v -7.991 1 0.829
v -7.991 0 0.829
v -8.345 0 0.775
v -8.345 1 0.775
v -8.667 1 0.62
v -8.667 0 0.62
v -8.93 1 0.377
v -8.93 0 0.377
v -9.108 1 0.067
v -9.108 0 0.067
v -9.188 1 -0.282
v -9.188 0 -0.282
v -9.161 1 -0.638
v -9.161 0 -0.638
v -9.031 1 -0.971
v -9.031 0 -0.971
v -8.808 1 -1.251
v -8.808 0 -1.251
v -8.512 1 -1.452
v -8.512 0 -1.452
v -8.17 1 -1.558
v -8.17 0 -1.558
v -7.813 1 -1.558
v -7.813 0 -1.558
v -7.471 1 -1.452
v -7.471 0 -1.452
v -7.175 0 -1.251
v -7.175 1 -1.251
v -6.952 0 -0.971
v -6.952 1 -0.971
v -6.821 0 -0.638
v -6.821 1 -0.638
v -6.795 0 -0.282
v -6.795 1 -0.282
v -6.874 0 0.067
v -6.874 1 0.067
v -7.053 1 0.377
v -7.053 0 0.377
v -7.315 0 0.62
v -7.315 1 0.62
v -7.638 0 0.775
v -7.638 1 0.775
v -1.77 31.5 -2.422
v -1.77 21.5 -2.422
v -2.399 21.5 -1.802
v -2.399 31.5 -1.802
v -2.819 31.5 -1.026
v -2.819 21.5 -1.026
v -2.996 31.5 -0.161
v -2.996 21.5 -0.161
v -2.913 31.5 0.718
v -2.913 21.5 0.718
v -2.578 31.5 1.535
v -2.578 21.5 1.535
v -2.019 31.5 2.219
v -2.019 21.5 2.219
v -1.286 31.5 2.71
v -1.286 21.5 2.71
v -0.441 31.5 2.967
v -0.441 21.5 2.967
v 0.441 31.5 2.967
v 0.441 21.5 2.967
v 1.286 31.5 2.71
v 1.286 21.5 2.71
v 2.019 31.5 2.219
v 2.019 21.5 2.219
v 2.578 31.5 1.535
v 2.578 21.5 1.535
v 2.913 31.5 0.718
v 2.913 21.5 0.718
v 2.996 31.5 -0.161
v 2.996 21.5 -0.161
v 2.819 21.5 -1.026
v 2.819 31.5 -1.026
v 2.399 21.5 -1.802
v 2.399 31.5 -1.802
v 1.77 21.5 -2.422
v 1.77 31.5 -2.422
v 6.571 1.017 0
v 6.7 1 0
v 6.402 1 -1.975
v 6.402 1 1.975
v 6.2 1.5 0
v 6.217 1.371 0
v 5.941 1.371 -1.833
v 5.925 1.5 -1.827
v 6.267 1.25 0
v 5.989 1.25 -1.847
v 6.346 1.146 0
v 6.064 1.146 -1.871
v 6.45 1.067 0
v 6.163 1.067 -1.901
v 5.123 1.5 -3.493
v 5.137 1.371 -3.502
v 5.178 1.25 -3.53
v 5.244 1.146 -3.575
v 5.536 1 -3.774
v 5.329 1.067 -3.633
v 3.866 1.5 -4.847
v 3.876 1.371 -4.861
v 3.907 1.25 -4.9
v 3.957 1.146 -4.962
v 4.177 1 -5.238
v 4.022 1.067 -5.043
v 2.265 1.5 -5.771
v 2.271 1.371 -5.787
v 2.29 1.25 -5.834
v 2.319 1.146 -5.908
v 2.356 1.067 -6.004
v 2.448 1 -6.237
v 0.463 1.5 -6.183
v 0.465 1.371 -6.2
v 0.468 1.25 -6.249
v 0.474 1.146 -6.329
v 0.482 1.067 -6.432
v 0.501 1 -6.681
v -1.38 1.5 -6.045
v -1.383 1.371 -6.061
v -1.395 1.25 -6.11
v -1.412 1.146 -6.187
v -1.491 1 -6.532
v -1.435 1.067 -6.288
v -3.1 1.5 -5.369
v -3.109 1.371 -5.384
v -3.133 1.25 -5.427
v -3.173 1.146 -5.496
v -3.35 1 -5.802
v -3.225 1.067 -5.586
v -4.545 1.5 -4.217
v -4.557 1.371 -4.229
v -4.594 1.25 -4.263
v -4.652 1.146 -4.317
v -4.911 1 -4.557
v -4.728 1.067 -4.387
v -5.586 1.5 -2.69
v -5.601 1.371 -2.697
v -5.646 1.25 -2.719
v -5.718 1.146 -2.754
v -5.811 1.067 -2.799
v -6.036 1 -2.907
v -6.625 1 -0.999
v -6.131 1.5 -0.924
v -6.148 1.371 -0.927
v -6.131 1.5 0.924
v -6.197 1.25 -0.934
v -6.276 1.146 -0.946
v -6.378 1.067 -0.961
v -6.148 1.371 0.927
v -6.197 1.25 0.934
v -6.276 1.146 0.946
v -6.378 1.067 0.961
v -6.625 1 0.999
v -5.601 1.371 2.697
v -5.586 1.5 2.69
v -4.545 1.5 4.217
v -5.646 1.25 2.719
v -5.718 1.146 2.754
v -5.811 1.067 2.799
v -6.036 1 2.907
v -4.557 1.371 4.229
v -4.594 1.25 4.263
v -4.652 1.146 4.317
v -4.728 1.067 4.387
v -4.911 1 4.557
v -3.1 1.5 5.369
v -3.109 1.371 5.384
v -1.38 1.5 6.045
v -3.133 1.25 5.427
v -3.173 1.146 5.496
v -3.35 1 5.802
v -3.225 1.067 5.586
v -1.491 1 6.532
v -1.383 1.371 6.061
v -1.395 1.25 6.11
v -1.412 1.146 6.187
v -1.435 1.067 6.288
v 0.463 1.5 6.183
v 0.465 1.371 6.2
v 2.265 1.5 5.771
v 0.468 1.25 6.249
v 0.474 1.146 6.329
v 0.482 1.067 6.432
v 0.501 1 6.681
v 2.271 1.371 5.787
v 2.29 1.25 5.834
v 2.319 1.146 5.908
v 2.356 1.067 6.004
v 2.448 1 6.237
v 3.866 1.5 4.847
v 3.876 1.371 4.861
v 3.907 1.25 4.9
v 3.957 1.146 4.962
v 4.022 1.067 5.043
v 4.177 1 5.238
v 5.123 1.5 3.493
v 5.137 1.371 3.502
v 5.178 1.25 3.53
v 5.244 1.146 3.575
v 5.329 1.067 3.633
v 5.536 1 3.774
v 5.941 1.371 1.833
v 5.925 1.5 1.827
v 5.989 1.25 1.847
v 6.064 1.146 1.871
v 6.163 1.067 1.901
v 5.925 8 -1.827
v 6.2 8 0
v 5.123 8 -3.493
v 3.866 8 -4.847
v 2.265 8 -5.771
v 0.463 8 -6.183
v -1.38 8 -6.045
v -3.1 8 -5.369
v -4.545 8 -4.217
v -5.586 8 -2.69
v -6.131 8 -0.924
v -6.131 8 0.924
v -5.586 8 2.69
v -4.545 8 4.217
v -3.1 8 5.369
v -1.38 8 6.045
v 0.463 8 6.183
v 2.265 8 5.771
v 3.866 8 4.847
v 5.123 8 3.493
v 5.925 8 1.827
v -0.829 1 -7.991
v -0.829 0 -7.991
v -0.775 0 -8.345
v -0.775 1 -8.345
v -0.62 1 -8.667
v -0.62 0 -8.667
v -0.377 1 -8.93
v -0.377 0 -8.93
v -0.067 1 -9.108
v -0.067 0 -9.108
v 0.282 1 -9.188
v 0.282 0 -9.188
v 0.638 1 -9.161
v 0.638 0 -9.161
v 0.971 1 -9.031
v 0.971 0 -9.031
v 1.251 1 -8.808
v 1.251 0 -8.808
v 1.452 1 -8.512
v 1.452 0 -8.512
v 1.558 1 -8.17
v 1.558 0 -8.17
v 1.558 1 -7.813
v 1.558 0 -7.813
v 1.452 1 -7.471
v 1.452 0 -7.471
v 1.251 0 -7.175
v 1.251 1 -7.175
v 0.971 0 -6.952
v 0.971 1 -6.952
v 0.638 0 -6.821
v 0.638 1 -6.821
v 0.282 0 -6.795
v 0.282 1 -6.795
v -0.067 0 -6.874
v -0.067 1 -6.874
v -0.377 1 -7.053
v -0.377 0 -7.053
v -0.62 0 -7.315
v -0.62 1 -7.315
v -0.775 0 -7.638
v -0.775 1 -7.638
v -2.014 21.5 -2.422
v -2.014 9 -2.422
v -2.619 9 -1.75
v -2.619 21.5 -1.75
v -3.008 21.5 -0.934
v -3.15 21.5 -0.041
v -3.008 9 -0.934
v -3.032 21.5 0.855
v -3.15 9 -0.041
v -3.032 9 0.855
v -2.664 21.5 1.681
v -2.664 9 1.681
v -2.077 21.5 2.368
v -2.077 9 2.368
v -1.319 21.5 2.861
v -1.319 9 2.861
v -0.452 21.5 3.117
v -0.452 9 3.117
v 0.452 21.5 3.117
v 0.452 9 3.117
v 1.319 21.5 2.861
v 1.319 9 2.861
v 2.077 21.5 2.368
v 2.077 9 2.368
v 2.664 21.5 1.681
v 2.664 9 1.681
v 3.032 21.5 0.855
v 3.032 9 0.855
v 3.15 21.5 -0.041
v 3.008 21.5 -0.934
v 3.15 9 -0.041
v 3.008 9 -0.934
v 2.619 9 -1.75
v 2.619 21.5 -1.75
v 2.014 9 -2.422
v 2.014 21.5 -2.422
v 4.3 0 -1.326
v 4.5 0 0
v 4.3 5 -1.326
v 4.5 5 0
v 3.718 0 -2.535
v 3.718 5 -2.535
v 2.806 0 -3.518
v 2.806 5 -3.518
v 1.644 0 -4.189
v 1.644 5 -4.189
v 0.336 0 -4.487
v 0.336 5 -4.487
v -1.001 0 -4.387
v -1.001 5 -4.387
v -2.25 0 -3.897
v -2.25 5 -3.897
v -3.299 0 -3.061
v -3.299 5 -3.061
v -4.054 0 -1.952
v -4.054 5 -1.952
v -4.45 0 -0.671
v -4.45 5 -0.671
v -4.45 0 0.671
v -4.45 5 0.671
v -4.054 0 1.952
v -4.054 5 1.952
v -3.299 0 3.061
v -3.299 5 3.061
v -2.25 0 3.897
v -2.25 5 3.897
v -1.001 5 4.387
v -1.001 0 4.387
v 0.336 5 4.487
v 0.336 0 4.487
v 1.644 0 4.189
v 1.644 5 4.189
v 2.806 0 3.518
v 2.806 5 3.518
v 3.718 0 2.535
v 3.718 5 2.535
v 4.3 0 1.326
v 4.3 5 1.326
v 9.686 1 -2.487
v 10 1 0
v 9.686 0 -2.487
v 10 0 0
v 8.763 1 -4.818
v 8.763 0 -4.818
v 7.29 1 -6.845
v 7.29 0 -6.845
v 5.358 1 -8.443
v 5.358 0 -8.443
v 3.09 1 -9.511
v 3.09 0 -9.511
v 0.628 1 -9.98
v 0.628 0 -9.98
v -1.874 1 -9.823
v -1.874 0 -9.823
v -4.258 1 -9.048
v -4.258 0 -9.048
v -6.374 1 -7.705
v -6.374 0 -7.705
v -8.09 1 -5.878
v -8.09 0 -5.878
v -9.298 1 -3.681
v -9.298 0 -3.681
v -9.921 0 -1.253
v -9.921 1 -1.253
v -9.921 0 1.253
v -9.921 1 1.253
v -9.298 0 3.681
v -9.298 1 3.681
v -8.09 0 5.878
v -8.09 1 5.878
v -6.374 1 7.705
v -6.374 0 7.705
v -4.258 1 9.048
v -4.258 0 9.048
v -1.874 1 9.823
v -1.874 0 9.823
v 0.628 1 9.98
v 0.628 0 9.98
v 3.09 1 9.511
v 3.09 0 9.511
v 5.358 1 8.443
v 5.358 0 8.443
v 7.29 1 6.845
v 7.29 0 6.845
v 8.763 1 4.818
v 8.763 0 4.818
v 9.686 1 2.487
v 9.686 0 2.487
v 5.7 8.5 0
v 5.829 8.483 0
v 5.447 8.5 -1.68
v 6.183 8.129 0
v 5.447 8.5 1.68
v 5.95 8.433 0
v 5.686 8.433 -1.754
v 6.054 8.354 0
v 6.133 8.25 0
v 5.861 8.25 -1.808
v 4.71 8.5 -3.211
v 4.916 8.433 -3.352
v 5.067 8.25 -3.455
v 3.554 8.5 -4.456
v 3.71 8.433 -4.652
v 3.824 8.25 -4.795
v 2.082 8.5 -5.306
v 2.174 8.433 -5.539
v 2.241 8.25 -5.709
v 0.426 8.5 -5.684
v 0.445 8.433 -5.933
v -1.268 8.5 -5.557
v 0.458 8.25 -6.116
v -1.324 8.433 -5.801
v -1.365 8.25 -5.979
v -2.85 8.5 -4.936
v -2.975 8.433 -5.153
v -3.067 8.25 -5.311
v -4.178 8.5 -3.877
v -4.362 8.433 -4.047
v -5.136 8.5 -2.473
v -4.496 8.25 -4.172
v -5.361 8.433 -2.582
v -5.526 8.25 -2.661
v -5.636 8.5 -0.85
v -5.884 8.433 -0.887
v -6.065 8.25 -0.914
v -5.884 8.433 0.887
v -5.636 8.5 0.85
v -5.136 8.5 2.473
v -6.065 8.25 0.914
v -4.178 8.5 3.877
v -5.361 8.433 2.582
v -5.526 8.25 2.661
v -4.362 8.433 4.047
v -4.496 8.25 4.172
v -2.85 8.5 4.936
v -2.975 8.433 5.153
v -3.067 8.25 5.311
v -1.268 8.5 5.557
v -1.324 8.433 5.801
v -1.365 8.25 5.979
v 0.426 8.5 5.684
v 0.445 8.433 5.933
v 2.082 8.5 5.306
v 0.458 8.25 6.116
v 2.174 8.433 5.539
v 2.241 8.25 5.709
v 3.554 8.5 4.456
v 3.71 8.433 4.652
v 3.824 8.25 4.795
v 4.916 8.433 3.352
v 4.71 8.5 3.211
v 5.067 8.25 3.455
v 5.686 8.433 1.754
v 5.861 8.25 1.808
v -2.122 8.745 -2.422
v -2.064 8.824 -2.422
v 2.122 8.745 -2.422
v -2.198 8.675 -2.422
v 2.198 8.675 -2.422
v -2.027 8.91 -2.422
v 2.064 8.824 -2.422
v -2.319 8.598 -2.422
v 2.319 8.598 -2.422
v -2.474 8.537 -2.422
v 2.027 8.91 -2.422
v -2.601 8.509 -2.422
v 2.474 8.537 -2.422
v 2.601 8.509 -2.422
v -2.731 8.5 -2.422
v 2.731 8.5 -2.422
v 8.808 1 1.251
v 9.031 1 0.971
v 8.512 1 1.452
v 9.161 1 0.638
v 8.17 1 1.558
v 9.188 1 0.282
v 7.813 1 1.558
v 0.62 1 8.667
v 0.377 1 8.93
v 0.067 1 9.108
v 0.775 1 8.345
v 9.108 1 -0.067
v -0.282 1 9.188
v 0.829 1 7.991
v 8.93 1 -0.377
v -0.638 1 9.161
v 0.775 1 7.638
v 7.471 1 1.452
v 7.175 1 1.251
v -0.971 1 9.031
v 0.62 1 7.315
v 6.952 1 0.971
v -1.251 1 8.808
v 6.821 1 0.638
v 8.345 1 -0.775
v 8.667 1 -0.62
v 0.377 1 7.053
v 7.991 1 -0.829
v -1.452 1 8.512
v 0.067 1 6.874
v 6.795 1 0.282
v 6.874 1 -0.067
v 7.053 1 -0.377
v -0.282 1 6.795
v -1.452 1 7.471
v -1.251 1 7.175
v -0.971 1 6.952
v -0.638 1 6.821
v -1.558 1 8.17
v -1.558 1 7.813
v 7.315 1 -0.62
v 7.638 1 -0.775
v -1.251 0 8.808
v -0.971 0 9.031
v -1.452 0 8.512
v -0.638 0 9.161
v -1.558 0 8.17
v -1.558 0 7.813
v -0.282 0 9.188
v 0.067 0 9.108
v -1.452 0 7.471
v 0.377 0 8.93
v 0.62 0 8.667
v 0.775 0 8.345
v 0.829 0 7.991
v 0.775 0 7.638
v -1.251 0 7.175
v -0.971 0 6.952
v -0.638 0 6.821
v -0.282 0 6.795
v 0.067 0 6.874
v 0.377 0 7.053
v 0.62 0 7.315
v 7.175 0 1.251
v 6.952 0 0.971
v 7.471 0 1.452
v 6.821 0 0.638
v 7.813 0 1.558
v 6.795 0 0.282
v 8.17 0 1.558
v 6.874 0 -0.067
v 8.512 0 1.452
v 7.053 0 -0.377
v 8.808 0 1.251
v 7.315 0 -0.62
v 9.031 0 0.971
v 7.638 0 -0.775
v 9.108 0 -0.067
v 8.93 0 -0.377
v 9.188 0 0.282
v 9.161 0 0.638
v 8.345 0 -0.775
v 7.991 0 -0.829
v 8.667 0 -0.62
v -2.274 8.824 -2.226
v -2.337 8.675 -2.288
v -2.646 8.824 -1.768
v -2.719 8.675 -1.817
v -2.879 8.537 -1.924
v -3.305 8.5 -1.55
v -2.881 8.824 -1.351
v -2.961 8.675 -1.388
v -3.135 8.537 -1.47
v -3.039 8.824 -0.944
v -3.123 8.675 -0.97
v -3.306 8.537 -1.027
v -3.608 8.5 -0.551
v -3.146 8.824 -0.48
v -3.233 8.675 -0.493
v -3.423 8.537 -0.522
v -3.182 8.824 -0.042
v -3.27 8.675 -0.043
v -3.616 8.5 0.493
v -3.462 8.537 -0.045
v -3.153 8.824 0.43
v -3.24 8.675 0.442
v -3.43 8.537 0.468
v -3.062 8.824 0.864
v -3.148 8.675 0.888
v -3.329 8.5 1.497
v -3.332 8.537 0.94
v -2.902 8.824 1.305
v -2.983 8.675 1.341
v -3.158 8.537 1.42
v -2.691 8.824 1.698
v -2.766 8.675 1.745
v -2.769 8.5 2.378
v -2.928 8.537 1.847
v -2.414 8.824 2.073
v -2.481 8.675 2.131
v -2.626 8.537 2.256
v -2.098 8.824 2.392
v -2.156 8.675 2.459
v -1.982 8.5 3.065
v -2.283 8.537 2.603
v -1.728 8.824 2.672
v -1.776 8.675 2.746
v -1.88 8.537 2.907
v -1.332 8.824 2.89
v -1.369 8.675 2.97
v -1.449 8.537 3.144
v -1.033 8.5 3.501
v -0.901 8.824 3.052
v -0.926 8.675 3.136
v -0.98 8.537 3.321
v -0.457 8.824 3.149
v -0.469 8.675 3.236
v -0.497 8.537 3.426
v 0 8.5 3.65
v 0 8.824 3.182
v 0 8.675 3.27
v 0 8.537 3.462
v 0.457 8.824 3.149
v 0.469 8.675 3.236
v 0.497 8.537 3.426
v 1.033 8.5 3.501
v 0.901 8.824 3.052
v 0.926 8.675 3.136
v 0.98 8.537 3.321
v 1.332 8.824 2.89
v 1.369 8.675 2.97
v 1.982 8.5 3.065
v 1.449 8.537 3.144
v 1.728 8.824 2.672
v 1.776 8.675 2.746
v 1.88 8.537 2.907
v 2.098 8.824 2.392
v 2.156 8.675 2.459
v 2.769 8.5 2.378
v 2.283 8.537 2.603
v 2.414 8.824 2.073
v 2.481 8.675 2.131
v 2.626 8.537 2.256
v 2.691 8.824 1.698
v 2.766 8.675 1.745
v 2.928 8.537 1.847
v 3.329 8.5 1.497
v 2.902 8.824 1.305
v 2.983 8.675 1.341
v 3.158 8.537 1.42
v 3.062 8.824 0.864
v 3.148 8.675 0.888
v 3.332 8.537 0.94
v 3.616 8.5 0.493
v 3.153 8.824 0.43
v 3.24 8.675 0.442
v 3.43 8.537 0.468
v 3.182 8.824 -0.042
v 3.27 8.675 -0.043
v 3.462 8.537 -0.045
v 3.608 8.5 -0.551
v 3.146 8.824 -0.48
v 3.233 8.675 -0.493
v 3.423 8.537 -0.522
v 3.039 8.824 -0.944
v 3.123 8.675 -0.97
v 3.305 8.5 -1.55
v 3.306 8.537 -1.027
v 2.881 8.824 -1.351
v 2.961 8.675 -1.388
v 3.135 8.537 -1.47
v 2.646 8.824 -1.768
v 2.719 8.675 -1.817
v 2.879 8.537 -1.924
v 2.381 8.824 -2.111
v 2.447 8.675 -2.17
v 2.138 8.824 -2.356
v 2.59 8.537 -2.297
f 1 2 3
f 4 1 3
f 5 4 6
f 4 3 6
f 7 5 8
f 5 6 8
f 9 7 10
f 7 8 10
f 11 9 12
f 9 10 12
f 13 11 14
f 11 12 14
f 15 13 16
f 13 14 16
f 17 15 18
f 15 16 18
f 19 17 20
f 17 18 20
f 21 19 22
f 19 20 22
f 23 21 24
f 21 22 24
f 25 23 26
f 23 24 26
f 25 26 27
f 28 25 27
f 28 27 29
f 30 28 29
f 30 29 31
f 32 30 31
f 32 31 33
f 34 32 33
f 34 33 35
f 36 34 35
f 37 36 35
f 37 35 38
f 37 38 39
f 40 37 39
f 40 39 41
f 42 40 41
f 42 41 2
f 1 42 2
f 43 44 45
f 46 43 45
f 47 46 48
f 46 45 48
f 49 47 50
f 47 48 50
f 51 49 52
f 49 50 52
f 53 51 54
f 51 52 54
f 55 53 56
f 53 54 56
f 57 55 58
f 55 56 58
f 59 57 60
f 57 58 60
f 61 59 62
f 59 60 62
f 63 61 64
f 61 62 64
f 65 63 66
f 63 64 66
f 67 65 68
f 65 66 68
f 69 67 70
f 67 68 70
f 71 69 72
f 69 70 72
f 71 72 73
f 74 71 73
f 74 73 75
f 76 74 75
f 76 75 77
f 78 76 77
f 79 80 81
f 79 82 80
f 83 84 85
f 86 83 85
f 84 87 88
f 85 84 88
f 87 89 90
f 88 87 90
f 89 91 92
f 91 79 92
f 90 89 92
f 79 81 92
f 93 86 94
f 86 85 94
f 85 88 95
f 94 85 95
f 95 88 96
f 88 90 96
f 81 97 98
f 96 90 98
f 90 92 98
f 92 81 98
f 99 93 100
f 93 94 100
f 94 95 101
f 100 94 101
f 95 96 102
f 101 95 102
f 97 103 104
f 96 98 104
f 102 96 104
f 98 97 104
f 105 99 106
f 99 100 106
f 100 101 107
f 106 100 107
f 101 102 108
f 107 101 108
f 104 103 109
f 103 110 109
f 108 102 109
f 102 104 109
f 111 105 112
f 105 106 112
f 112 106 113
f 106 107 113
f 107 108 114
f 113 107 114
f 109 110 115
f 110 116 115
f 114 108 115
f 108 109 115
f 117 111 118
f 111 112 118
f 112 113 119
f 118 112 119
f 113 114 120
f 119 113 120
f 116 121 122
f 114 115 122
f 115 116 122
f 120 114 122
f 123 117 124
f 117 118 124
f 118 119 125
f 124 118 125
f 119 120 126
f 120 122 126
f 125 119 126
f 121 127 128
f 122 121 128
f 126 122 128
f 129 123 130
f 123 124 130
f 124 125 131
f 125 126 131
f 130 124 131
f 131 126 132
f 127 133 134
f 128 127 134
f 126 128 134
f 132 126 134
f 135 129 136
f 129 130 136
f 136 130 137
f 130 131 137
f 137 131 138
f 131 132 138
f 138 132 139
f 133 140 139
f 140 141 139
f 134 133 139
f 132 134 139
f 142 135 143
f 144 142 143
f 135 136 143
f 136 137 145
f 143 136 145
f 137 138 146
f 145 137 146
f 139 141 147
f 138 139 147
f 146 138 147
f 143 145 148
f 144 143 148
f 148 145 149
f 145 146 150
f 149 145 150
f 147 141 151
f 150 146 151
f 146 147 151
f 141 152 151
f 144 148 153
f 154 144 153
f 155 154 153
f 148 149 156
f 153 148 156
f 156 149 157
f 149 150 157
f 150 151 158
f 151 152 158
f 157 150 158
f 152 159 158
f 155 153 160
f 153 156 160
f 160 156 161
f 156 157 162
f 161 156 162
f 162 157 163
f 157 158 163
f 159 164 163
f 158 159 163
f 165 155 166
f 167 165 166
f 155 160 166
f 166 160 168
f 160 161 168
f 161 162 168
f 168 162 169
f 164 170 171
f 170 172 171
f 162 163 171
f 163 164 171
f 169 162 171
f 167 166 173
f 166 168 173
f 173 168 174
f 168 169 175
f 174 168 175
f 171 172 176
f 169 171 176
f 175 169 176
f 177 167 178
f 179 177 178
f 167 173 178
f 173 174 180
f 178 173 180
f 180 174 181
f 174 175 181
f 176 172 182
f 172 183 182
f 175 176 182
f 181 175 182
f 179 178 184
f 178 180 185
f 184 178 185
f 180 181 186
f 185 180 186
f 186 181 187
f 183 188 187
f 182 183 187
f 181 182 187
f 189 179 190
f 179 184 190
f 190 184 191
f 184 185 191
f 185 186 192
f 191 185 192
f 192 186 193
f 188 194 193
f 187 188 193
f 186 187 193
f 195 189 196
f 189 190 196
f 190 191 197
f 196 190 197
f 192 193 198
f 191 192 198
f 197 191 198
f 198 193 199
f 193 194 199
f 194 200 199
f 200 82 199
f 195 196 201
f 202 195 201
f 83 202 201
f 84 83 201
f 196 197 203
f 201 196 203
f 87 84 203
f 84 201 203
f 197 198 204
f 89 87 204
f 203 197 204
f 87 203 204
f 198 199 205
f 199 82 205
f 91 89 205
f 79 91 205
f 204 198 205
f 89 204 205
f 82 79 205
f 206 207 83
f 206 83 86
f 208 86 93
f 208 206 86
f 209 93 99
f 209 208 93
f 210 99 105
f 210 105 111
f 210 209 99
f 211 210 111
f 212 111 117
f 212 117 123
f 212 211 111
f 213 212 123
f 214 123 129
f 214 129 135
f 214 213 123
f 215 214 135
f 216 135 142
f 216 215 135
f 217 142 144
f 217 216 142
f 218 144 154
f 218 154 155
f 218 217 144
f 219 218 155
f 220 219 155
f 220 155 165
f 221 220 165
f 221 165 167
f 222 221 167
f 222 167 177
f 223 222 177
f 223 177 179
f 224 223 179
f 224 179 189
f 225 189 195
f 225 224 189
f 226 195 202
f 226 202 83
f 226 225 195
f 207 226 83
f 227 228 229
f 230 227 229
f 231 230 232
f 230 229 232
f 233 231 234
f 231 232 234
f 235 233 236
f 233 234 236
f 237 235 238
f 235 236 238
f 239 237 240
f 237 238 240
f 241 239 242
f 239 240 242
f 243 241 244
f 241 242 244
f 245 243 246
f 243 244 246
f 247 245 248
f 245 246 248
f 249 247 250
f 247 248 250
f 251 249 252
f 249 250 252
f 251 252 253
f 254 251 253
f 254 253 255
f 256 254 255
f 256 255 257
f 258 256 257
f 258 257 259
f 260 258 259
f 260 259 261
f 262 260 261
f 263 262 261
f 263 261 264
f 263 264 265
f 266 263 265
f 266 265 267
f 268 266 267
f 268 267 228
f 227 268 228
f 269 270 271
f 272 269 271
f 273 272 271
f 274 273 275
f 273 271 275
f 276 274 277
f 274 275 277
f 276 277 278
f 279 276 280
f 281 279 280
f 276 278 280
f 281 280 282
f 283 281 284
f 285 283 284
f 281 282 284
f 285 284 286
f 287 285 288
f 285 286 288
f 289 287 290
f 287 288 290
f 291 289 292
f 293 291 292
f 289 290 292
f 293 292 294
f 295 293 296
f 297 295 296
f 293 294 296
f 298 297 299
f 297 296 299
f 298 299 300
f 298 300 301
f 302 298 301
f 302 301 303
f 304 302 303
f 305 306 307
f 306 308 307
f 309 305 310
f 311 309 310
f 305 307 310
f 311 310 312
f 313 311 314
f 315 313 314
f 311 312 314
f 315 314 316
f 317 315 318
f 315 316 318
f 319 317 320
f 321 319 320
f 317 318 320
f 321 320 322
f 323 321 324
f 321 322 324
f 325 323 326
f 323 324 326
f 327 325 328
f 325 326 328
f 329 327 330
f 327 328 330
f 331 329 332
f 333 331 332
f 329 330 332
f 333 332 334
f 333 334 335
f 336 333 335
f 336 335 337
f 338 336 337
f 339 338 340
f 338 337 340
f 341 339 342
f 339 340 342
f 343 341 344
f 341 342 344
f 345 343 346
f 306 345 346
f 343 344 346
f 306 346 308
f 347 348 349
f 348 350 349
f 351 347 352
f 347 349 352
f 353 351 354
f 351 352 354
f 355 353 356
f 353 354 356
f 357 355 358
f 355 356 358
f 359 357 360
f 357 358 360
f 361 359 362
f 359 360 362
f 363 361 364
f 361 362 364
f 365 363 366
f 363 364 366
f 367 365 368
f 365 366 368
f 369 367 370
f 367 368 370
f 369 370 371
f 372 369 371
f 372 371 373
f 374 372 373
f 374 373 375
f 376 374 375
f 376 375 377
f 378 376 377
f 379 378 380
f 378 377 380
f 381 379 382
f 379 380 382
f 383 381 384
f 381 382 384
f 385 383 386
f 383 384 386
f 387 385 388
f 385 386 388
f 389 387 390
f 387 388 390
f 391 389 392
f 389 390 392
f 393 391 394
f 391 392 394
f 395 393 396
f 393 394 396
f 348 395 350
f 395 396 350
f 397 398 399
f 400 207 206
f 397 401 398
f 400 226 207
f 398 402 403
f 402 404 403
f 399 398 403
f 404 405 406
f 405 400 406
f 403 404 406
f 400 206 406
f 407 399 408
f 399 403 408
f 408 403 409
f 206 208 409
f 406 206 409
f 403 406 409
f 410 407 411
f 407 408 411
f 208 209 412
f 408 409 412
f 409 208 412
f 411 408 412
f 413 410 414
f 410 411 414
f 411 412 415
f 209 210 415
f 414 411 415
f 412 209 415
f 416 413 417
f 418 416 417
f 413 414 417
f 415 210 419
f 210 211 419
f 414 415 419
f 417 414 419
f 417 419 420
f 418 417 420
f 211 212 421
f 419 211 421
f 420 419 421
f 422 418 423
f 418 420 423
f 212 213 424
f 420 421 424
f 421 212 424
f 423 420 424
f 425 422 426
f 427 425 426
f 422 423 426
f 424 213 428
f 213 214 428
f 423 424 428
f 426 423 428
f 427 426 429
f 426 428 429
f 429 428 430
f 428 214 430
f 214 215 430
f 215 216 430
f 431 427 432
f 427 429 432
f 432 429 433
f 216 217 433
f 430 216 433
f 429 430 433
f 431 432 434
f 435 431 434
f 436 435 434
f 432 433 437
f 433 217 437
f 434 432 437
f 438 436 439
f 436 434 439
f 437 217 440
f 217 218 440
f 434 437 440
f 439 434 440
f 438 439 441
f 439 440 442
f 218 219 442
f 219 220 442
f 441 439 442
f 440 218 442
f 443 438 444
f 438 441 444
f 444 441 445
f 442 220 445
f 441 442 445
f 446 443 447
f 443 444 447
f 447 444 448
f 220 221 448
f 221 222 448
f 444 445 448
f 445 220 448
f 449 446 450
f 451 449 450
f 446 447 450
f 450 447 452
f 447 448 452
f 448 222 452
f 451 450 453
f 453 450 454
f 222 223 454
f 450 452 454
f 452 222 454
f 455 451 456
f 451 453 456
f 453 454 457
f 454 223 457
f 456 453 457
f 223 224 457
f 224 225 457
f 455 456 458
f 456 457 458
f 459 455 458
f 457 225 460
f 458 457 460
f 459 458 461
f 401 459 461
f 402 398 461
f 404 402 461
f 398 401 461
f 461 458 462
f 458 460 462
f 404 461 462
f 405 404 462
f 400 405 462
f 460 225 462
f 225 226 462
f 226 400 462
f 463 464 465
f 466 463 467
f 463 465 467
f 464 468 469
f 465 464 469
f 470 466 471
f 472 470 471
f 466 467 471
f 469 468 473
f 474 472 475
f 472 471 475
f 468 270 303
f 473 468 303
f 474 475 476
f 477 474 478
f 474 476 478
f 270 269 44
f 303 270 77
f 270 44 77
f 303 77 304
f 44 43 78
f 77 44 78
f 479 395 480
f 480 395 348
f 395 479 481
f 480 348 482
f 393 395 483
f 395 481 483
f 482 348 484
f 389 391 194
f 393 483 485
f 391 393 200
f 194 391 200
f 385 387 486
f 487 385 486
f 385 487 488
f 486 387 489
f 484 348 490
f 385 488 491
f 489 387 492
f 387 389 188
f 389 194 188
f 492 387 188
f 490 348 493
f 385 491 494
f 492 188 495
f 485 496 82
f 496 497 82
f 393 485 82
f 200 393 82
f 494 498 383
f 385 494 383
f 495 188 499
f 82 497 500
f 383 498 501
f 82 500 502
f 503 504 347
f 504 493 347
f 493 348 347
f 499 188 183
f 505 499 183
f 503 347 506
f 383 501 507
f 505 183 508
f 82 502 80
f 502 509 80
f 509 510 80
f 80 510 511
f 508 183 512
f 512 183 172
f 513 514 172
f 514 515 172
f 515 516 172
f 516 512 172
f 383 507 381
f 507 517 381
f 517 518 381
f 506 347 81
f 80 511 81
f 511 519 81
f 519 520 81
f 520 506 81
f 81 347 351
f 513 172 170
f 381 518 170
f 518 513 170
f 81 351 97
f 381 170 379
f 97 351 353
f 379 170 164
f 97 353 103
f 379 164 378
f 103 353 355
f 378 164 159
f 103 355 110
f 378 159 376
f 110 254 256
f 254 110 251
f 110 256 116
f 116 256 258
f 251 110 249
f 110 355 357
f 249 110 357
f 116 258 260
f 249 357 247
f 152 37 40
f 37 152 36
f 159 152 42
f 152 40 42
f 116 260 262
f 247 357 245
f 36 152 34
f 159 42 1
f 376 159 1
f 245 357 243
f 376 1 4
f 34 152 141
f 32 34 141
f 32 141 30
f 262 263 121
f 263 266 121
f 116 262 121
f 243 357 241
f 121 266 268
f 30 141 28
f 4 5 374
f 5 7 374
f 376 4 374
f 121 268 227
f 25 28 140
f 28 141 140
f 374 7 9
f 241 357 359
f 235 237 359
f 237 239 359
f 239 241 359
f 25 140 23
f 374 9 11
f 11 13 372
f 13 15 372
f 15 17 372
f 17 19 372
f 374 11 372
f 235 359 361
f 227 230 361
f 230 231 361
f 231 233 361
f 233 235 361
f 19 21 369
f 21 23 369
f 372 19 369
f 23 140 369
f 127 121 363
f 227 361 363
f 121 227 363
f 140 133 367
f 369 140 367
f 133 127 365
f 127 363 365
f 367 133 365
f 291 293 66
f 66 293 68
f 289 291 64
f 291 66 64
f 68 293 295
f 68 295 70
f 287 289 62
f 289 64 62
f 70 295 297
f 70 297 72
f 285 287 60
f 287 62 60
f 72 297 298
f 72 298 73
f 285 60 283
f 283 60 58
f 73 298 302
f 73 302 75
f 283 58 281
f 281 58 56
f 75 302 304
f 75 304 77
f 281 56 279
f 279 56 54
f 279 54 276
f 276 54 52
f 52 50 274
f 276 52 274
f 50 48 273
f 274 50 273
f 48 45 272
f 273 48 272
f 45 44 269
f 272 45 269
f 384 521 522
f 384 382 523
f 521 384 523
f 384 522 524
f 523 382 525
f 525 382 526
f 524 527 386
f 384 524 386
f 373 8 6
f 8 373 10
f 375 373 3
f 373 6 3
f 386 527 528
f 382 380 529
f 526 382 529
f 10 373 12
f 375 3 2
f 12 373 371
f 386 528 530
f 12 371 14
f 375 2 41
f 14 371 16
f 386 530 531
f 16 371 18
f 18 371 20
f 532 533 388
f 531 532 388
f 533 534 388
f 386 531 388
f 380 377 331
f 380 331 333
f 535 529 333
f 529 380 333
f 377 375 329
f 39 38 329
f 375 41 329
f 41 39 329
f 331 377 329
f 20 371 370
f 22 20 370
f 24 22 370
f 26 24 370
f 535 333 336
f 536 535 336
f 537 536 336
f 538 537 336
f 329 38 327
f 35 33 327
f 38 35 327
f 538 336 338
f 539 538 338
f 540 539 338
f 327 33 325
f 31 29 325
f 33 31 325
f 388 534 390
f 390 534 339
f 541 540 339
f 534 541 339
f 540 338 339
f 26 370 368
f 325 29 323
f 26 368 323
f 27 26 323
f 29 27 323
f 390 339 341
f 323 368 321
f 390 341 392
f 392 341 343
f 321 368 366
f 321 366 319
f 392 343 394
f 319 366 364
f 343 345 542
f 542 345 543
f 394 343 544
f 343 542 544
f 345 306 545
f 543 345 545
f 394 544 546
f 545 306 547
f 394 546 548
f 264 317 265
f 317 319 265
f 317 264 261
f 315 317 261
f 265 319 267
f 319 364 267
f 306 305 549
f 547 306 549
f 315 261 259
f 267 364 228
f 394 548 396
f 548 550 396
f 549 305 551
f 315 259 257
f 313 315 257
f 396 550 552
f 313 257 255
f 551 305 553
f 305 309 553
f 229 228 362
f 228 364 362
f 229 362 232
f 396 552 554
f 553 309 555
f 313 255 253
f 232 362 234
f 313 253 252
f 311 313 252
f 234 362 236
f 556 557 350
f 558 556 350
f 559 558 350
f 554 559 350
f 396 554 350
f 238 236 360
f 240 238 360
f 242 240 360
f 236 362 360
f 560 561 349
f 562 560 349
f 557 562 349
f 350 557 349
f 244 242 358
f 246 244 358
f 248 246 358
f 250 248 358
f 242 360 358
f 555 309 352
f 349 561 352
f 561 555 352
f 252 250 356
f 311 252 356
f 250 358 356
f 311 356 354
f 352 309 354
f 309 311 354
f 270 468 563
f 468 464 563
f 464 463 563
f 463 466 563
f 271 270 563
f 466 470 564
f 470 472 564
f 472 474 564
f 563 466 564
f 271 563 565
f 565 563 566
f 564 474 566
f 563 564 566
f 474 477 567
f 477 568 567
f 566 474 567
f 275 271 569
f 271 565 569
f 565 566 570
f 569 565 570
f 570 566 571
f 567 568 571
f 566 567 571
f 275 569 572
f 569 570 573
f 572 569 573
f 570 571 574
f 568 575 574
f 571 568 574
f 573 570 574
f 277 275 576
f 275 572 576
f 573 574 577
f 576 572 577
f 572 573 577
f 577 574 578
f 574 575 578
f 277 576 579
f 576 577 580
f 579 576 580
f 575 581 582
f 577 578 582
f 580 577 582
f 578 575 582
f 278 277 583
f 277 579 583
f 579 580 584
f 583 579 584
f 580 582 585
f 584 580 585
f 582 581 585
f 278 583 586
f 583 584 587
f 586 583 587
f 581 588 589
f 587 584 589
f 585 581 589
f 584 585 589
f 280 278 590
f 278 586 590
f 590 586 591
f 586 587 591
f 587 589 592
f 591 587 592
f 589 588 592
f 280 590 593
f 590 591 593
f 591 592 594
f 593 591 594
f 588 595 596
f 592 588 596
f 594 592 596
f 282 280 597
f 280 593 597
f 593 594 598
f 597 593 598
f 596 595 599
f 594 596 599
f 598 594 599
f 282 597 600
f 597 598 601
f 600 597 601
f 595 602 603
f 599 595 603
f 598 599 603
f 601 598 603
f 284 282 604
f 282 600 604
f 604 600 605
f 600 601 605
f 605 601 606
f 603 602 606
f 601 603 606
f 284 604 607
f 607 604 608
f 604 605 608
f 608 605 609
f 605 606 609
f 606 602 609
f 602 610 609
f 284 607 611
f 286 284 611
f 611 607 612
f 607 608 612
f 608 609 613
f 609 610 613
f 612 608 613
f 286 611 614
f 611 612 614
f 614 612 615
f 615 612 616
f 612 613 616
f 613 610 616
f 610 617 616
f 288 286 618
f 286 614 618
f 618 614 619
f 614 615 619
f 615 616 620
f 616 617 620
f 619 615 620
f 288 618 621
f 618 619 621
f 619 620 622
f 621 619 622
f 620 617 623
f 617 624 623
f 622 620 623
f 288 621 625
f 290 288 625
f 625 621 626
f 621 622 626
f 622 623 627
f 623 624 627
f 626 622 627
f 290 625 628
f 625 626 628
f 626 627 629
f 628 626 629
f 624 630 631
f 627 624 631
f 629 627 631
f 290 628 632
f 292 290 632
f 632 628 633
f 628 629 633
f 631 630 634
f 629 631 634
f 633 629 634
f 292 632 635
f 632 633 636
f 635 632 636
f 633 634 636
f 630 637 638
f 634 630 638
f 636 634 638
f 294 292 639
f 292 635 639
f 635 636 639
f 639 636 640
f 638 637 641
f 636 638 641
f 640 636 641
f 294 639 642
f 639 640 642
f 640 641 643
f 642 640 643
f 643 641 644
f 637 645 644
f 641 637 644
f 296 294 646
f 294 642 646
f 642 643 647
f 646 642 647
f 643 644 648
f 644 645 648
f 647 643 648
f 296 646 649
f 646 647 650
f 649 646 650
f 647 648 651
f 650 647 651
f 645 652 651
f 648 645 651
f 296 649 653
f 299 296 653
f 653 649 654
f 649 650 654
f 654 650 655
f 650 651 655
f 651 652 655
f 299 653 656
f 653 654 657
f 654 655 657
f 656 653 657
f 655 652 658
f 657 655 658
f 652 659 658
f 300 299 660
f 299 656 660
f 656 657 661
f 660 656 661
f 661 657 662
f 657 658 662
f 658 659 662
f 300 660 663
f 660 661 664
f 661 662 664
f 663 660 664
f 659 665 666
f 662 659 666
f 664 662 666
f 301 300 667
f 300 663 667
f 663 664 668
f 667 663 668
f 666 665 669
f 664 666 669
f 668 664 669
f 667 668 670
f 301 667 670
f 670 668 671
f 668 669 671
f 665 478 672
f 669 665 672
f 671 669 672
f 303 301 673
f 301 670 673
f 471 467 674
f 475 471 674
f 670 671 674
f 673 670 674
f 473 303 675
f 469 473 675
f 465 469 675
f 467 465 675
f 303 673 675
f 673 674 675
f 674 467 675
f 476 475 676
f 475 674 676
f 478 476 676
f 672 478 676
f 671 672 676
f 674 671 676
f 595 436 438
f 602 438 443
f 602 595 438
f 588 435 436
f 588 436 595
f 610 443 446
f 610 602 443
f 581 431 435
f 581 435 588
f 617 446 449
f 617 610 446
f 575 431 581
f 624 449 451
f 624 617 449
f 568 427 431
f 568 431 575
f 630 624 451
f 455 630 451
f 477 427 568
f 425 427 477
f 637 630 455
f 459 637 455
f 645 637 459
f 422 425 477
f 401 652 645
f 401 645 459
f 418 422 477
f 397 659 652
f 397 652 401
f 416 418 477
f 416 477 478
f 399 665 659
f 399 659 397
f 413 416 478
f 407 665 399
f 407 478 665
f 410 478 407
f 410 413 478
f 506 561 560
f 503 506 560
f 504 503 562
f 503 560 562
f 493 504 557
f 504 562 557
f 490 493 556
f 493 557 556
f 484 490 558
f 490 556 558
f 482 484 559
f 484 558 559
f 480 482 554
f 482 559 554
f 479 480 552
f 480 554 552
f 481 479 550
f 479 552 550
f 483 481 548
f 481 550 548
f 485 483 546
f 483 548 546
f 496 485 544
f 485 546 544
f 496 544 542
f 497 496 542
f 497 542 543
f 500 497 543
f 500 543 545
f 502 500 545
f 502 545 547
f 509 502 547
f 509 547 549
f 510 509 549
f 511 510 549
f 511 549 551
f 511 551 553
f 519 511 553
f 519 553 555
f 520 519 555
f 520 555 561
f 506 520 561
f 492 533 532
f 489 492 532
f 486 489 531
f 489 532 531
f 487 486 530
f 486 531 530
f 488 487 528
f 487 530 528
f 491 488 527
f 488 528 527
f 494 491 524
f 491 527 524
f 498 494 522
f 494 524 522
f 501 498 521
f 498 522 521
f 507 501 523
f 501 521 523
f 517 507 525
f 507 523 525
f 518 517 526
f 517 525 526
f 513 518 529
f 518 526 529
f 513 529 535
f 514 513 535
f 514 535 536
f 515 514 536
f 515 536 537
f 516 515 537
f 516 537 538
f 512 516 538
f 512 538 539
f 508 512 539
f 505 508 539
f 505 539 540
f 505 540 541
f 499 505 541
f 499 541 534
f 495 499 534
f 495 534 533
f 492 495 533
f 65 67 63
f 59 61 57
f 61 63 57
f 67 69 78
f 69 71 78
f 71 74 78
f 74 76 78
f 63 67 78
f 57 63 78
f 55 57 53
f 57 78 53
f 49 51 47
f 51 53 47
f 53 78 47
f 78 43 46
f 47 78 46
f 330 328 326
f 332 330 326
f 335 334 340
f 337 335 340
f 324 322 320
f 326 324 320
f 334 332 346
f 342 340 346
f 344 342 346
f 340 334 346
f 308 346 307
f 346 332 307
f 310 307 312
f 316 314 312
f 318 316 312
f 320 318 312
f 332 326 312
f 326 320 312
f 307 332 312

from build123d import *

# Parameters (mm, degrees)
ESQUISSE3_W                  = 6.57785754
ESQUISSE3_H                  = 1.386048805
ENL_V_MAT_EXTRU_1_DEPTH      = 23
M2_CLEARANCE_HOLE1_D         = 2.4
M2_CLEARANCE_HOLE1_DEPTH     = 1.001
R_P_TITION_CIRCULAIRE1_COUNT = 4
FILLET1_R                    = 0.5


with BuildPart() as part:
    # Esquisse2 → Révolution2 (revolve)
    with BuildSketch(Plane.XY):
        Polygon((0, 31.5), (3, 31.5), (3, 21.5), (3.15, 21.5), (3.15, 8.5), (6.2, 8.5), (6.2, 3), (6.2, 1), (10, 1), (10, 0), (4.5, 0), (4.5, 5), (0, 5), align=None)
    revolve(axis=Axis((0, 5, 0), (0, 1, 0)))

    # Esquisse3 → Enlèv. mat.-Extru.1 (cut)
    with BuildSketch(Plane(origin=(0, 31.5, 0), x_dir=(1, 0, 0), z_dir=(0, 1, 0))):
        with Locations((-0.352413472, 3.114928535)):
            Rectangle(ESQUISSE3_W, ESQUISSE3_H)
    extrude(amount=-ENL_V_MAT_EXTRU_1_DEPTH, mode=Mode.SUBTRACT)

    # M2 Clearance Hole1
    with Locations(Plane(origin=(0, 1, 0), x_dir=(1, 0, 0), z_dir=(0, 1, 0))):
        with Locations((0.371303159, 7.991378727)):
            m2_clearance_hole1 = Hole(M2_CLEARANCE_HOLE1_D / 2, depth=M2_CLEARANCE_HOLE1_DEPTH)

    # Répétition circulaire1: M2 Clearance Hole1 ×4 about axis
    r_p_tition_circulaire1_axis = Axis((0, 0, 0), (0, 1, 0))
    for i in range(1, R_P_TITION_CIRCULAIRE1_COUNT):
        add(m2_clearance_hole1.rotate(r_p_tition_circulaire1_axis, i * 360 / R_P_TITION_CIRCULAIRE1_COUNT), mode=Mode.SUBTRACT)

    # Fillet1
    fillet1_edges = [part.edges().sort_by_distance(p)[0] for p in [
        (-6.2, 1, 0),
        (-6.2, 8.5, 0),
        (0, 8.5, 3.15),
    ]]
    fillet(fillet1_edges, radius=FILLET1_R)


solid = part.part
